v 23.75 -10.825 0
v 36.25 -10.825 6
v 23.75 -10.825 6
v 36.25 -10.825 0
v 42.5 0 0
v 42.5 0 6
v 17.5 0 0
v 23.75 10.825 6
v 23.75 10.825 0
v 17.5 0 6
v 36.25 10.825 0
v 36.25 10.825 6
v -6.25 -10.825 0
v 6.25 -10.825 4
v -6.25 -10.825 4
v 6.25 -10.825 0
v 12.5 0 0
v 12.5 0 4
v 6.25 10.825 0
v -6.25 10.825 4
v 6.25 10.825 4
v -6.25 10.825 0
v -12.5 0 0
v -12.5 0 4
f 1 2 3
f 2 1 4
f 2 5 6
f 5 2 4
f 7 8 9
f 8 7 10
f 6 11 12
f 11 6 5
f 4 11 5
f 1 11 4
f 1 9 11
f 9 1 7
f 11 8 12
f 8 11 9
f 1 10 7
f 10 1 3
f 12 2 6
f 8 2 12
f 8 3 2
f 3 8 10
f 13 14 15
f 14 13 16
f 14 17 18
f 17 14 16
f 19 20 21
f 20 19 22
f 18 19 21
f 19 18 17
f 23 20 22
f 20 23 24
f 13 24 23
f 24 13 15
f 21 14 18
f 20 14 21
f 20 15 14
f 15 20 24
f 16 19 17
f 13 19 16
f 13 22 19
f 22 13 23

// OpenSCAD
// Metric screw threads (polyhedron version)
// Adrian McCarthy 2023-11-05

// https://en.wikipedia.org/wiki/ISO_metric_screw_thread
// * internal thread: tap=true and subtract the resulting shape
// * external thread: tap=false

module AT_threads(h, d, pitch, tap=true, nozzle_d=0.4) {
    thread_h = pitch / (2*tan(30));
    // An M3 screw has a major diameter of 3 mm.  For a tap, we nudge it
    // up with the nozzle diameter to compensate for the problem of
    // printing accurate holes and to generally provide some clearance.
    d_major = d + (tap ? nozzle_d : -nozzle_d);
    d_minor = d_major - 2 * (5/8) * thread_h;
    d_max = d_major + 2*thread_h/8;
    d_min = d_minor - 2*thread_h/4;
    
    echo(str("M", d, "x", pitch, ": thread_h=", thread_h, "; d_major=", d_major, "; d_minor=", d_minor));

    x_major = 0;
    x_deep  = x_major + thread_h/8;
    x_minor = x_major - 5/8*thread_h;
    x_clear = x_minor - thread_h/4;
    y_major = pitch/16;
    y_minor = 3/8 * pitch;
    
    r = d_major / 2;

    slices_per_turn =
        ($fn > 0) ? max(3, $fn)
                  : max(5, ceil(min(360/$fa, 2*PI*r / $fs)));
    dtheta = 360 / slices_per_turn;
    echo(str("$fn=", $fn, ", $fa=", $fa, ", $fs=", $fs));
    echo(str("dtheta for threads = ", dtheta));
    echo(str("slices per turn = ", slices_per_turn));

    extended_h = h + pitch;
    
    slice_count = ceil(slices_per_turn * extended_h / pitch);

    function circle_points(z) = [
        for (i=[0:slices_per_turn-1])
            let (
                theta = i*dtheta,
                c = cos(theta),
                s = sin(theta)
            ) [c*(r + x_minor), s*(r + x_minor), z]
    ];

    function tooth_points(angle) = 
        let (c = cos(angle), s = sin(angle), z = pitch*angle/360)
        [
            [c*(r + x_minor), s*(r + x_minor), z + y_minor],
            [c*(r + x_deep),  s*(r + x_deep),  z          ],
            [c*(r + x_minor), s*(r + x_minor), z - y_minor]
        ];
    points_per_slice = len(tooth_points(0));

    function bottom(slice) =
        assert(slice <= slices_per_turn)
        slice % slices_per_turn;
    function top(slice)    =
        slice % slices_per_turn + slices_per_turn;
    function index(slice) =
        assert(slice <= slice_count)
        2*slices_per_turn + slice * points_per_slice;

    function panel(a0) = [
        let (
            s0 = a0 <= slice_count ? index(a0) : undef,
            l0 = a0 >= slices_per_turn ?
                index(a0 - slices_per_turn) : undef,
            skirt0b = l0 ? l0+0 : bottom(a0),
            skirt0t = a0 < slice_count ? s0+2 : top(a0),
            skirt0ex = a0 == slice_count ? [s0+2, s0+0] : [],
            u0 = a0 + slices_per_turn <= slice_count ?
                index(a0 + slices_per_turn) : undef,
            collar0ex = u0 ? [u0+2, u0+0] : [],

            a1 = a0 + 1,
            s1 = a1 <= slice_count ? index(a1) : undef,
            l1 = a1 >= slices_per_turn ?
                index(a1 - slices_per_turn) : undef,
            skirt1b = a1 > slices_per_turn ? l1+0 : bottom(a1),
            skirt1t = s1 ? s1+2 : top(a1),
            skirt1ex = l1 && (a1 == slice_count) ?
                [l1+0, l1+2] : [],
            u1 = a1 + slices_per_turn <= slice_count ?
                index(a1 + slices_per_turn) : undef
        )
        each [
            each [if (s0 && s1)
                each [[s0+2, s0+1, s1+1, s1+2],
                      [s0+1, s0+0, s1+0, s1+1]]
            ],
            [skirt0b, each skirt0ex, skirt0t, skirt1t, each skirt1ex, skirt1b],
            each [if (a0 == 0) [s0+2, s0+0, s0+1]],
            each [if (a1 == slice_count) [s1+2, s1+1, s1+0]],
            each [if (s0 && s1 && !u1) [s0+0, each collar0ex, top(a0), top(a1), s1+0]]
        ]
    ];

    all_points =
        [each circle_points(0-pitch/2),
         each circle_points(extended_h+pitch/2),
         for (slice=[0:slice_count]) each tooth_points(slice*dtheta)];

    panel_count = max(slice_count, slices_per_turn);
    all_faces = [
        each [for (a0=[0:panel_count-1]) each panel(a0)],
        [for (a0=[0:slices_per_turn-1]) bottom(a0)],
        [for (a0=[slices_per_turn-1:-1:0]) top(a0)]
    ];

    intersection() {
        translate([0, 0, -pitch/2])
            polyhedron(all_points, all_faces, convexity=6);
        // Intersect with a cube to trim it to final height
        extend = tap ? 0.1 : 0;
        translate([0, 0, -extend])
            linear_extrude(h+2*extend)
                square(d_max, center=true);
    }
}

module AT_demo_threads() {
    $fn=60;
    pitch=1.5;
    union() {
        cylinder(h=4, d=25, $fn=6);
        translate([0, 0, 4])
            AT_threads(h=4*pitch, d=18, pitch=pitch, tap=false, nozzle_d=0.4);
    }

    translate([30, 0, 0]) difference() {
        cylinder(h=4*pitch, d=25, $fn=6);
        AT_threads(h=4*pitch, d=18, pitch=pitch, tap=true, nozzle_d=0.4);
    }
}

AT_demo_threads();
